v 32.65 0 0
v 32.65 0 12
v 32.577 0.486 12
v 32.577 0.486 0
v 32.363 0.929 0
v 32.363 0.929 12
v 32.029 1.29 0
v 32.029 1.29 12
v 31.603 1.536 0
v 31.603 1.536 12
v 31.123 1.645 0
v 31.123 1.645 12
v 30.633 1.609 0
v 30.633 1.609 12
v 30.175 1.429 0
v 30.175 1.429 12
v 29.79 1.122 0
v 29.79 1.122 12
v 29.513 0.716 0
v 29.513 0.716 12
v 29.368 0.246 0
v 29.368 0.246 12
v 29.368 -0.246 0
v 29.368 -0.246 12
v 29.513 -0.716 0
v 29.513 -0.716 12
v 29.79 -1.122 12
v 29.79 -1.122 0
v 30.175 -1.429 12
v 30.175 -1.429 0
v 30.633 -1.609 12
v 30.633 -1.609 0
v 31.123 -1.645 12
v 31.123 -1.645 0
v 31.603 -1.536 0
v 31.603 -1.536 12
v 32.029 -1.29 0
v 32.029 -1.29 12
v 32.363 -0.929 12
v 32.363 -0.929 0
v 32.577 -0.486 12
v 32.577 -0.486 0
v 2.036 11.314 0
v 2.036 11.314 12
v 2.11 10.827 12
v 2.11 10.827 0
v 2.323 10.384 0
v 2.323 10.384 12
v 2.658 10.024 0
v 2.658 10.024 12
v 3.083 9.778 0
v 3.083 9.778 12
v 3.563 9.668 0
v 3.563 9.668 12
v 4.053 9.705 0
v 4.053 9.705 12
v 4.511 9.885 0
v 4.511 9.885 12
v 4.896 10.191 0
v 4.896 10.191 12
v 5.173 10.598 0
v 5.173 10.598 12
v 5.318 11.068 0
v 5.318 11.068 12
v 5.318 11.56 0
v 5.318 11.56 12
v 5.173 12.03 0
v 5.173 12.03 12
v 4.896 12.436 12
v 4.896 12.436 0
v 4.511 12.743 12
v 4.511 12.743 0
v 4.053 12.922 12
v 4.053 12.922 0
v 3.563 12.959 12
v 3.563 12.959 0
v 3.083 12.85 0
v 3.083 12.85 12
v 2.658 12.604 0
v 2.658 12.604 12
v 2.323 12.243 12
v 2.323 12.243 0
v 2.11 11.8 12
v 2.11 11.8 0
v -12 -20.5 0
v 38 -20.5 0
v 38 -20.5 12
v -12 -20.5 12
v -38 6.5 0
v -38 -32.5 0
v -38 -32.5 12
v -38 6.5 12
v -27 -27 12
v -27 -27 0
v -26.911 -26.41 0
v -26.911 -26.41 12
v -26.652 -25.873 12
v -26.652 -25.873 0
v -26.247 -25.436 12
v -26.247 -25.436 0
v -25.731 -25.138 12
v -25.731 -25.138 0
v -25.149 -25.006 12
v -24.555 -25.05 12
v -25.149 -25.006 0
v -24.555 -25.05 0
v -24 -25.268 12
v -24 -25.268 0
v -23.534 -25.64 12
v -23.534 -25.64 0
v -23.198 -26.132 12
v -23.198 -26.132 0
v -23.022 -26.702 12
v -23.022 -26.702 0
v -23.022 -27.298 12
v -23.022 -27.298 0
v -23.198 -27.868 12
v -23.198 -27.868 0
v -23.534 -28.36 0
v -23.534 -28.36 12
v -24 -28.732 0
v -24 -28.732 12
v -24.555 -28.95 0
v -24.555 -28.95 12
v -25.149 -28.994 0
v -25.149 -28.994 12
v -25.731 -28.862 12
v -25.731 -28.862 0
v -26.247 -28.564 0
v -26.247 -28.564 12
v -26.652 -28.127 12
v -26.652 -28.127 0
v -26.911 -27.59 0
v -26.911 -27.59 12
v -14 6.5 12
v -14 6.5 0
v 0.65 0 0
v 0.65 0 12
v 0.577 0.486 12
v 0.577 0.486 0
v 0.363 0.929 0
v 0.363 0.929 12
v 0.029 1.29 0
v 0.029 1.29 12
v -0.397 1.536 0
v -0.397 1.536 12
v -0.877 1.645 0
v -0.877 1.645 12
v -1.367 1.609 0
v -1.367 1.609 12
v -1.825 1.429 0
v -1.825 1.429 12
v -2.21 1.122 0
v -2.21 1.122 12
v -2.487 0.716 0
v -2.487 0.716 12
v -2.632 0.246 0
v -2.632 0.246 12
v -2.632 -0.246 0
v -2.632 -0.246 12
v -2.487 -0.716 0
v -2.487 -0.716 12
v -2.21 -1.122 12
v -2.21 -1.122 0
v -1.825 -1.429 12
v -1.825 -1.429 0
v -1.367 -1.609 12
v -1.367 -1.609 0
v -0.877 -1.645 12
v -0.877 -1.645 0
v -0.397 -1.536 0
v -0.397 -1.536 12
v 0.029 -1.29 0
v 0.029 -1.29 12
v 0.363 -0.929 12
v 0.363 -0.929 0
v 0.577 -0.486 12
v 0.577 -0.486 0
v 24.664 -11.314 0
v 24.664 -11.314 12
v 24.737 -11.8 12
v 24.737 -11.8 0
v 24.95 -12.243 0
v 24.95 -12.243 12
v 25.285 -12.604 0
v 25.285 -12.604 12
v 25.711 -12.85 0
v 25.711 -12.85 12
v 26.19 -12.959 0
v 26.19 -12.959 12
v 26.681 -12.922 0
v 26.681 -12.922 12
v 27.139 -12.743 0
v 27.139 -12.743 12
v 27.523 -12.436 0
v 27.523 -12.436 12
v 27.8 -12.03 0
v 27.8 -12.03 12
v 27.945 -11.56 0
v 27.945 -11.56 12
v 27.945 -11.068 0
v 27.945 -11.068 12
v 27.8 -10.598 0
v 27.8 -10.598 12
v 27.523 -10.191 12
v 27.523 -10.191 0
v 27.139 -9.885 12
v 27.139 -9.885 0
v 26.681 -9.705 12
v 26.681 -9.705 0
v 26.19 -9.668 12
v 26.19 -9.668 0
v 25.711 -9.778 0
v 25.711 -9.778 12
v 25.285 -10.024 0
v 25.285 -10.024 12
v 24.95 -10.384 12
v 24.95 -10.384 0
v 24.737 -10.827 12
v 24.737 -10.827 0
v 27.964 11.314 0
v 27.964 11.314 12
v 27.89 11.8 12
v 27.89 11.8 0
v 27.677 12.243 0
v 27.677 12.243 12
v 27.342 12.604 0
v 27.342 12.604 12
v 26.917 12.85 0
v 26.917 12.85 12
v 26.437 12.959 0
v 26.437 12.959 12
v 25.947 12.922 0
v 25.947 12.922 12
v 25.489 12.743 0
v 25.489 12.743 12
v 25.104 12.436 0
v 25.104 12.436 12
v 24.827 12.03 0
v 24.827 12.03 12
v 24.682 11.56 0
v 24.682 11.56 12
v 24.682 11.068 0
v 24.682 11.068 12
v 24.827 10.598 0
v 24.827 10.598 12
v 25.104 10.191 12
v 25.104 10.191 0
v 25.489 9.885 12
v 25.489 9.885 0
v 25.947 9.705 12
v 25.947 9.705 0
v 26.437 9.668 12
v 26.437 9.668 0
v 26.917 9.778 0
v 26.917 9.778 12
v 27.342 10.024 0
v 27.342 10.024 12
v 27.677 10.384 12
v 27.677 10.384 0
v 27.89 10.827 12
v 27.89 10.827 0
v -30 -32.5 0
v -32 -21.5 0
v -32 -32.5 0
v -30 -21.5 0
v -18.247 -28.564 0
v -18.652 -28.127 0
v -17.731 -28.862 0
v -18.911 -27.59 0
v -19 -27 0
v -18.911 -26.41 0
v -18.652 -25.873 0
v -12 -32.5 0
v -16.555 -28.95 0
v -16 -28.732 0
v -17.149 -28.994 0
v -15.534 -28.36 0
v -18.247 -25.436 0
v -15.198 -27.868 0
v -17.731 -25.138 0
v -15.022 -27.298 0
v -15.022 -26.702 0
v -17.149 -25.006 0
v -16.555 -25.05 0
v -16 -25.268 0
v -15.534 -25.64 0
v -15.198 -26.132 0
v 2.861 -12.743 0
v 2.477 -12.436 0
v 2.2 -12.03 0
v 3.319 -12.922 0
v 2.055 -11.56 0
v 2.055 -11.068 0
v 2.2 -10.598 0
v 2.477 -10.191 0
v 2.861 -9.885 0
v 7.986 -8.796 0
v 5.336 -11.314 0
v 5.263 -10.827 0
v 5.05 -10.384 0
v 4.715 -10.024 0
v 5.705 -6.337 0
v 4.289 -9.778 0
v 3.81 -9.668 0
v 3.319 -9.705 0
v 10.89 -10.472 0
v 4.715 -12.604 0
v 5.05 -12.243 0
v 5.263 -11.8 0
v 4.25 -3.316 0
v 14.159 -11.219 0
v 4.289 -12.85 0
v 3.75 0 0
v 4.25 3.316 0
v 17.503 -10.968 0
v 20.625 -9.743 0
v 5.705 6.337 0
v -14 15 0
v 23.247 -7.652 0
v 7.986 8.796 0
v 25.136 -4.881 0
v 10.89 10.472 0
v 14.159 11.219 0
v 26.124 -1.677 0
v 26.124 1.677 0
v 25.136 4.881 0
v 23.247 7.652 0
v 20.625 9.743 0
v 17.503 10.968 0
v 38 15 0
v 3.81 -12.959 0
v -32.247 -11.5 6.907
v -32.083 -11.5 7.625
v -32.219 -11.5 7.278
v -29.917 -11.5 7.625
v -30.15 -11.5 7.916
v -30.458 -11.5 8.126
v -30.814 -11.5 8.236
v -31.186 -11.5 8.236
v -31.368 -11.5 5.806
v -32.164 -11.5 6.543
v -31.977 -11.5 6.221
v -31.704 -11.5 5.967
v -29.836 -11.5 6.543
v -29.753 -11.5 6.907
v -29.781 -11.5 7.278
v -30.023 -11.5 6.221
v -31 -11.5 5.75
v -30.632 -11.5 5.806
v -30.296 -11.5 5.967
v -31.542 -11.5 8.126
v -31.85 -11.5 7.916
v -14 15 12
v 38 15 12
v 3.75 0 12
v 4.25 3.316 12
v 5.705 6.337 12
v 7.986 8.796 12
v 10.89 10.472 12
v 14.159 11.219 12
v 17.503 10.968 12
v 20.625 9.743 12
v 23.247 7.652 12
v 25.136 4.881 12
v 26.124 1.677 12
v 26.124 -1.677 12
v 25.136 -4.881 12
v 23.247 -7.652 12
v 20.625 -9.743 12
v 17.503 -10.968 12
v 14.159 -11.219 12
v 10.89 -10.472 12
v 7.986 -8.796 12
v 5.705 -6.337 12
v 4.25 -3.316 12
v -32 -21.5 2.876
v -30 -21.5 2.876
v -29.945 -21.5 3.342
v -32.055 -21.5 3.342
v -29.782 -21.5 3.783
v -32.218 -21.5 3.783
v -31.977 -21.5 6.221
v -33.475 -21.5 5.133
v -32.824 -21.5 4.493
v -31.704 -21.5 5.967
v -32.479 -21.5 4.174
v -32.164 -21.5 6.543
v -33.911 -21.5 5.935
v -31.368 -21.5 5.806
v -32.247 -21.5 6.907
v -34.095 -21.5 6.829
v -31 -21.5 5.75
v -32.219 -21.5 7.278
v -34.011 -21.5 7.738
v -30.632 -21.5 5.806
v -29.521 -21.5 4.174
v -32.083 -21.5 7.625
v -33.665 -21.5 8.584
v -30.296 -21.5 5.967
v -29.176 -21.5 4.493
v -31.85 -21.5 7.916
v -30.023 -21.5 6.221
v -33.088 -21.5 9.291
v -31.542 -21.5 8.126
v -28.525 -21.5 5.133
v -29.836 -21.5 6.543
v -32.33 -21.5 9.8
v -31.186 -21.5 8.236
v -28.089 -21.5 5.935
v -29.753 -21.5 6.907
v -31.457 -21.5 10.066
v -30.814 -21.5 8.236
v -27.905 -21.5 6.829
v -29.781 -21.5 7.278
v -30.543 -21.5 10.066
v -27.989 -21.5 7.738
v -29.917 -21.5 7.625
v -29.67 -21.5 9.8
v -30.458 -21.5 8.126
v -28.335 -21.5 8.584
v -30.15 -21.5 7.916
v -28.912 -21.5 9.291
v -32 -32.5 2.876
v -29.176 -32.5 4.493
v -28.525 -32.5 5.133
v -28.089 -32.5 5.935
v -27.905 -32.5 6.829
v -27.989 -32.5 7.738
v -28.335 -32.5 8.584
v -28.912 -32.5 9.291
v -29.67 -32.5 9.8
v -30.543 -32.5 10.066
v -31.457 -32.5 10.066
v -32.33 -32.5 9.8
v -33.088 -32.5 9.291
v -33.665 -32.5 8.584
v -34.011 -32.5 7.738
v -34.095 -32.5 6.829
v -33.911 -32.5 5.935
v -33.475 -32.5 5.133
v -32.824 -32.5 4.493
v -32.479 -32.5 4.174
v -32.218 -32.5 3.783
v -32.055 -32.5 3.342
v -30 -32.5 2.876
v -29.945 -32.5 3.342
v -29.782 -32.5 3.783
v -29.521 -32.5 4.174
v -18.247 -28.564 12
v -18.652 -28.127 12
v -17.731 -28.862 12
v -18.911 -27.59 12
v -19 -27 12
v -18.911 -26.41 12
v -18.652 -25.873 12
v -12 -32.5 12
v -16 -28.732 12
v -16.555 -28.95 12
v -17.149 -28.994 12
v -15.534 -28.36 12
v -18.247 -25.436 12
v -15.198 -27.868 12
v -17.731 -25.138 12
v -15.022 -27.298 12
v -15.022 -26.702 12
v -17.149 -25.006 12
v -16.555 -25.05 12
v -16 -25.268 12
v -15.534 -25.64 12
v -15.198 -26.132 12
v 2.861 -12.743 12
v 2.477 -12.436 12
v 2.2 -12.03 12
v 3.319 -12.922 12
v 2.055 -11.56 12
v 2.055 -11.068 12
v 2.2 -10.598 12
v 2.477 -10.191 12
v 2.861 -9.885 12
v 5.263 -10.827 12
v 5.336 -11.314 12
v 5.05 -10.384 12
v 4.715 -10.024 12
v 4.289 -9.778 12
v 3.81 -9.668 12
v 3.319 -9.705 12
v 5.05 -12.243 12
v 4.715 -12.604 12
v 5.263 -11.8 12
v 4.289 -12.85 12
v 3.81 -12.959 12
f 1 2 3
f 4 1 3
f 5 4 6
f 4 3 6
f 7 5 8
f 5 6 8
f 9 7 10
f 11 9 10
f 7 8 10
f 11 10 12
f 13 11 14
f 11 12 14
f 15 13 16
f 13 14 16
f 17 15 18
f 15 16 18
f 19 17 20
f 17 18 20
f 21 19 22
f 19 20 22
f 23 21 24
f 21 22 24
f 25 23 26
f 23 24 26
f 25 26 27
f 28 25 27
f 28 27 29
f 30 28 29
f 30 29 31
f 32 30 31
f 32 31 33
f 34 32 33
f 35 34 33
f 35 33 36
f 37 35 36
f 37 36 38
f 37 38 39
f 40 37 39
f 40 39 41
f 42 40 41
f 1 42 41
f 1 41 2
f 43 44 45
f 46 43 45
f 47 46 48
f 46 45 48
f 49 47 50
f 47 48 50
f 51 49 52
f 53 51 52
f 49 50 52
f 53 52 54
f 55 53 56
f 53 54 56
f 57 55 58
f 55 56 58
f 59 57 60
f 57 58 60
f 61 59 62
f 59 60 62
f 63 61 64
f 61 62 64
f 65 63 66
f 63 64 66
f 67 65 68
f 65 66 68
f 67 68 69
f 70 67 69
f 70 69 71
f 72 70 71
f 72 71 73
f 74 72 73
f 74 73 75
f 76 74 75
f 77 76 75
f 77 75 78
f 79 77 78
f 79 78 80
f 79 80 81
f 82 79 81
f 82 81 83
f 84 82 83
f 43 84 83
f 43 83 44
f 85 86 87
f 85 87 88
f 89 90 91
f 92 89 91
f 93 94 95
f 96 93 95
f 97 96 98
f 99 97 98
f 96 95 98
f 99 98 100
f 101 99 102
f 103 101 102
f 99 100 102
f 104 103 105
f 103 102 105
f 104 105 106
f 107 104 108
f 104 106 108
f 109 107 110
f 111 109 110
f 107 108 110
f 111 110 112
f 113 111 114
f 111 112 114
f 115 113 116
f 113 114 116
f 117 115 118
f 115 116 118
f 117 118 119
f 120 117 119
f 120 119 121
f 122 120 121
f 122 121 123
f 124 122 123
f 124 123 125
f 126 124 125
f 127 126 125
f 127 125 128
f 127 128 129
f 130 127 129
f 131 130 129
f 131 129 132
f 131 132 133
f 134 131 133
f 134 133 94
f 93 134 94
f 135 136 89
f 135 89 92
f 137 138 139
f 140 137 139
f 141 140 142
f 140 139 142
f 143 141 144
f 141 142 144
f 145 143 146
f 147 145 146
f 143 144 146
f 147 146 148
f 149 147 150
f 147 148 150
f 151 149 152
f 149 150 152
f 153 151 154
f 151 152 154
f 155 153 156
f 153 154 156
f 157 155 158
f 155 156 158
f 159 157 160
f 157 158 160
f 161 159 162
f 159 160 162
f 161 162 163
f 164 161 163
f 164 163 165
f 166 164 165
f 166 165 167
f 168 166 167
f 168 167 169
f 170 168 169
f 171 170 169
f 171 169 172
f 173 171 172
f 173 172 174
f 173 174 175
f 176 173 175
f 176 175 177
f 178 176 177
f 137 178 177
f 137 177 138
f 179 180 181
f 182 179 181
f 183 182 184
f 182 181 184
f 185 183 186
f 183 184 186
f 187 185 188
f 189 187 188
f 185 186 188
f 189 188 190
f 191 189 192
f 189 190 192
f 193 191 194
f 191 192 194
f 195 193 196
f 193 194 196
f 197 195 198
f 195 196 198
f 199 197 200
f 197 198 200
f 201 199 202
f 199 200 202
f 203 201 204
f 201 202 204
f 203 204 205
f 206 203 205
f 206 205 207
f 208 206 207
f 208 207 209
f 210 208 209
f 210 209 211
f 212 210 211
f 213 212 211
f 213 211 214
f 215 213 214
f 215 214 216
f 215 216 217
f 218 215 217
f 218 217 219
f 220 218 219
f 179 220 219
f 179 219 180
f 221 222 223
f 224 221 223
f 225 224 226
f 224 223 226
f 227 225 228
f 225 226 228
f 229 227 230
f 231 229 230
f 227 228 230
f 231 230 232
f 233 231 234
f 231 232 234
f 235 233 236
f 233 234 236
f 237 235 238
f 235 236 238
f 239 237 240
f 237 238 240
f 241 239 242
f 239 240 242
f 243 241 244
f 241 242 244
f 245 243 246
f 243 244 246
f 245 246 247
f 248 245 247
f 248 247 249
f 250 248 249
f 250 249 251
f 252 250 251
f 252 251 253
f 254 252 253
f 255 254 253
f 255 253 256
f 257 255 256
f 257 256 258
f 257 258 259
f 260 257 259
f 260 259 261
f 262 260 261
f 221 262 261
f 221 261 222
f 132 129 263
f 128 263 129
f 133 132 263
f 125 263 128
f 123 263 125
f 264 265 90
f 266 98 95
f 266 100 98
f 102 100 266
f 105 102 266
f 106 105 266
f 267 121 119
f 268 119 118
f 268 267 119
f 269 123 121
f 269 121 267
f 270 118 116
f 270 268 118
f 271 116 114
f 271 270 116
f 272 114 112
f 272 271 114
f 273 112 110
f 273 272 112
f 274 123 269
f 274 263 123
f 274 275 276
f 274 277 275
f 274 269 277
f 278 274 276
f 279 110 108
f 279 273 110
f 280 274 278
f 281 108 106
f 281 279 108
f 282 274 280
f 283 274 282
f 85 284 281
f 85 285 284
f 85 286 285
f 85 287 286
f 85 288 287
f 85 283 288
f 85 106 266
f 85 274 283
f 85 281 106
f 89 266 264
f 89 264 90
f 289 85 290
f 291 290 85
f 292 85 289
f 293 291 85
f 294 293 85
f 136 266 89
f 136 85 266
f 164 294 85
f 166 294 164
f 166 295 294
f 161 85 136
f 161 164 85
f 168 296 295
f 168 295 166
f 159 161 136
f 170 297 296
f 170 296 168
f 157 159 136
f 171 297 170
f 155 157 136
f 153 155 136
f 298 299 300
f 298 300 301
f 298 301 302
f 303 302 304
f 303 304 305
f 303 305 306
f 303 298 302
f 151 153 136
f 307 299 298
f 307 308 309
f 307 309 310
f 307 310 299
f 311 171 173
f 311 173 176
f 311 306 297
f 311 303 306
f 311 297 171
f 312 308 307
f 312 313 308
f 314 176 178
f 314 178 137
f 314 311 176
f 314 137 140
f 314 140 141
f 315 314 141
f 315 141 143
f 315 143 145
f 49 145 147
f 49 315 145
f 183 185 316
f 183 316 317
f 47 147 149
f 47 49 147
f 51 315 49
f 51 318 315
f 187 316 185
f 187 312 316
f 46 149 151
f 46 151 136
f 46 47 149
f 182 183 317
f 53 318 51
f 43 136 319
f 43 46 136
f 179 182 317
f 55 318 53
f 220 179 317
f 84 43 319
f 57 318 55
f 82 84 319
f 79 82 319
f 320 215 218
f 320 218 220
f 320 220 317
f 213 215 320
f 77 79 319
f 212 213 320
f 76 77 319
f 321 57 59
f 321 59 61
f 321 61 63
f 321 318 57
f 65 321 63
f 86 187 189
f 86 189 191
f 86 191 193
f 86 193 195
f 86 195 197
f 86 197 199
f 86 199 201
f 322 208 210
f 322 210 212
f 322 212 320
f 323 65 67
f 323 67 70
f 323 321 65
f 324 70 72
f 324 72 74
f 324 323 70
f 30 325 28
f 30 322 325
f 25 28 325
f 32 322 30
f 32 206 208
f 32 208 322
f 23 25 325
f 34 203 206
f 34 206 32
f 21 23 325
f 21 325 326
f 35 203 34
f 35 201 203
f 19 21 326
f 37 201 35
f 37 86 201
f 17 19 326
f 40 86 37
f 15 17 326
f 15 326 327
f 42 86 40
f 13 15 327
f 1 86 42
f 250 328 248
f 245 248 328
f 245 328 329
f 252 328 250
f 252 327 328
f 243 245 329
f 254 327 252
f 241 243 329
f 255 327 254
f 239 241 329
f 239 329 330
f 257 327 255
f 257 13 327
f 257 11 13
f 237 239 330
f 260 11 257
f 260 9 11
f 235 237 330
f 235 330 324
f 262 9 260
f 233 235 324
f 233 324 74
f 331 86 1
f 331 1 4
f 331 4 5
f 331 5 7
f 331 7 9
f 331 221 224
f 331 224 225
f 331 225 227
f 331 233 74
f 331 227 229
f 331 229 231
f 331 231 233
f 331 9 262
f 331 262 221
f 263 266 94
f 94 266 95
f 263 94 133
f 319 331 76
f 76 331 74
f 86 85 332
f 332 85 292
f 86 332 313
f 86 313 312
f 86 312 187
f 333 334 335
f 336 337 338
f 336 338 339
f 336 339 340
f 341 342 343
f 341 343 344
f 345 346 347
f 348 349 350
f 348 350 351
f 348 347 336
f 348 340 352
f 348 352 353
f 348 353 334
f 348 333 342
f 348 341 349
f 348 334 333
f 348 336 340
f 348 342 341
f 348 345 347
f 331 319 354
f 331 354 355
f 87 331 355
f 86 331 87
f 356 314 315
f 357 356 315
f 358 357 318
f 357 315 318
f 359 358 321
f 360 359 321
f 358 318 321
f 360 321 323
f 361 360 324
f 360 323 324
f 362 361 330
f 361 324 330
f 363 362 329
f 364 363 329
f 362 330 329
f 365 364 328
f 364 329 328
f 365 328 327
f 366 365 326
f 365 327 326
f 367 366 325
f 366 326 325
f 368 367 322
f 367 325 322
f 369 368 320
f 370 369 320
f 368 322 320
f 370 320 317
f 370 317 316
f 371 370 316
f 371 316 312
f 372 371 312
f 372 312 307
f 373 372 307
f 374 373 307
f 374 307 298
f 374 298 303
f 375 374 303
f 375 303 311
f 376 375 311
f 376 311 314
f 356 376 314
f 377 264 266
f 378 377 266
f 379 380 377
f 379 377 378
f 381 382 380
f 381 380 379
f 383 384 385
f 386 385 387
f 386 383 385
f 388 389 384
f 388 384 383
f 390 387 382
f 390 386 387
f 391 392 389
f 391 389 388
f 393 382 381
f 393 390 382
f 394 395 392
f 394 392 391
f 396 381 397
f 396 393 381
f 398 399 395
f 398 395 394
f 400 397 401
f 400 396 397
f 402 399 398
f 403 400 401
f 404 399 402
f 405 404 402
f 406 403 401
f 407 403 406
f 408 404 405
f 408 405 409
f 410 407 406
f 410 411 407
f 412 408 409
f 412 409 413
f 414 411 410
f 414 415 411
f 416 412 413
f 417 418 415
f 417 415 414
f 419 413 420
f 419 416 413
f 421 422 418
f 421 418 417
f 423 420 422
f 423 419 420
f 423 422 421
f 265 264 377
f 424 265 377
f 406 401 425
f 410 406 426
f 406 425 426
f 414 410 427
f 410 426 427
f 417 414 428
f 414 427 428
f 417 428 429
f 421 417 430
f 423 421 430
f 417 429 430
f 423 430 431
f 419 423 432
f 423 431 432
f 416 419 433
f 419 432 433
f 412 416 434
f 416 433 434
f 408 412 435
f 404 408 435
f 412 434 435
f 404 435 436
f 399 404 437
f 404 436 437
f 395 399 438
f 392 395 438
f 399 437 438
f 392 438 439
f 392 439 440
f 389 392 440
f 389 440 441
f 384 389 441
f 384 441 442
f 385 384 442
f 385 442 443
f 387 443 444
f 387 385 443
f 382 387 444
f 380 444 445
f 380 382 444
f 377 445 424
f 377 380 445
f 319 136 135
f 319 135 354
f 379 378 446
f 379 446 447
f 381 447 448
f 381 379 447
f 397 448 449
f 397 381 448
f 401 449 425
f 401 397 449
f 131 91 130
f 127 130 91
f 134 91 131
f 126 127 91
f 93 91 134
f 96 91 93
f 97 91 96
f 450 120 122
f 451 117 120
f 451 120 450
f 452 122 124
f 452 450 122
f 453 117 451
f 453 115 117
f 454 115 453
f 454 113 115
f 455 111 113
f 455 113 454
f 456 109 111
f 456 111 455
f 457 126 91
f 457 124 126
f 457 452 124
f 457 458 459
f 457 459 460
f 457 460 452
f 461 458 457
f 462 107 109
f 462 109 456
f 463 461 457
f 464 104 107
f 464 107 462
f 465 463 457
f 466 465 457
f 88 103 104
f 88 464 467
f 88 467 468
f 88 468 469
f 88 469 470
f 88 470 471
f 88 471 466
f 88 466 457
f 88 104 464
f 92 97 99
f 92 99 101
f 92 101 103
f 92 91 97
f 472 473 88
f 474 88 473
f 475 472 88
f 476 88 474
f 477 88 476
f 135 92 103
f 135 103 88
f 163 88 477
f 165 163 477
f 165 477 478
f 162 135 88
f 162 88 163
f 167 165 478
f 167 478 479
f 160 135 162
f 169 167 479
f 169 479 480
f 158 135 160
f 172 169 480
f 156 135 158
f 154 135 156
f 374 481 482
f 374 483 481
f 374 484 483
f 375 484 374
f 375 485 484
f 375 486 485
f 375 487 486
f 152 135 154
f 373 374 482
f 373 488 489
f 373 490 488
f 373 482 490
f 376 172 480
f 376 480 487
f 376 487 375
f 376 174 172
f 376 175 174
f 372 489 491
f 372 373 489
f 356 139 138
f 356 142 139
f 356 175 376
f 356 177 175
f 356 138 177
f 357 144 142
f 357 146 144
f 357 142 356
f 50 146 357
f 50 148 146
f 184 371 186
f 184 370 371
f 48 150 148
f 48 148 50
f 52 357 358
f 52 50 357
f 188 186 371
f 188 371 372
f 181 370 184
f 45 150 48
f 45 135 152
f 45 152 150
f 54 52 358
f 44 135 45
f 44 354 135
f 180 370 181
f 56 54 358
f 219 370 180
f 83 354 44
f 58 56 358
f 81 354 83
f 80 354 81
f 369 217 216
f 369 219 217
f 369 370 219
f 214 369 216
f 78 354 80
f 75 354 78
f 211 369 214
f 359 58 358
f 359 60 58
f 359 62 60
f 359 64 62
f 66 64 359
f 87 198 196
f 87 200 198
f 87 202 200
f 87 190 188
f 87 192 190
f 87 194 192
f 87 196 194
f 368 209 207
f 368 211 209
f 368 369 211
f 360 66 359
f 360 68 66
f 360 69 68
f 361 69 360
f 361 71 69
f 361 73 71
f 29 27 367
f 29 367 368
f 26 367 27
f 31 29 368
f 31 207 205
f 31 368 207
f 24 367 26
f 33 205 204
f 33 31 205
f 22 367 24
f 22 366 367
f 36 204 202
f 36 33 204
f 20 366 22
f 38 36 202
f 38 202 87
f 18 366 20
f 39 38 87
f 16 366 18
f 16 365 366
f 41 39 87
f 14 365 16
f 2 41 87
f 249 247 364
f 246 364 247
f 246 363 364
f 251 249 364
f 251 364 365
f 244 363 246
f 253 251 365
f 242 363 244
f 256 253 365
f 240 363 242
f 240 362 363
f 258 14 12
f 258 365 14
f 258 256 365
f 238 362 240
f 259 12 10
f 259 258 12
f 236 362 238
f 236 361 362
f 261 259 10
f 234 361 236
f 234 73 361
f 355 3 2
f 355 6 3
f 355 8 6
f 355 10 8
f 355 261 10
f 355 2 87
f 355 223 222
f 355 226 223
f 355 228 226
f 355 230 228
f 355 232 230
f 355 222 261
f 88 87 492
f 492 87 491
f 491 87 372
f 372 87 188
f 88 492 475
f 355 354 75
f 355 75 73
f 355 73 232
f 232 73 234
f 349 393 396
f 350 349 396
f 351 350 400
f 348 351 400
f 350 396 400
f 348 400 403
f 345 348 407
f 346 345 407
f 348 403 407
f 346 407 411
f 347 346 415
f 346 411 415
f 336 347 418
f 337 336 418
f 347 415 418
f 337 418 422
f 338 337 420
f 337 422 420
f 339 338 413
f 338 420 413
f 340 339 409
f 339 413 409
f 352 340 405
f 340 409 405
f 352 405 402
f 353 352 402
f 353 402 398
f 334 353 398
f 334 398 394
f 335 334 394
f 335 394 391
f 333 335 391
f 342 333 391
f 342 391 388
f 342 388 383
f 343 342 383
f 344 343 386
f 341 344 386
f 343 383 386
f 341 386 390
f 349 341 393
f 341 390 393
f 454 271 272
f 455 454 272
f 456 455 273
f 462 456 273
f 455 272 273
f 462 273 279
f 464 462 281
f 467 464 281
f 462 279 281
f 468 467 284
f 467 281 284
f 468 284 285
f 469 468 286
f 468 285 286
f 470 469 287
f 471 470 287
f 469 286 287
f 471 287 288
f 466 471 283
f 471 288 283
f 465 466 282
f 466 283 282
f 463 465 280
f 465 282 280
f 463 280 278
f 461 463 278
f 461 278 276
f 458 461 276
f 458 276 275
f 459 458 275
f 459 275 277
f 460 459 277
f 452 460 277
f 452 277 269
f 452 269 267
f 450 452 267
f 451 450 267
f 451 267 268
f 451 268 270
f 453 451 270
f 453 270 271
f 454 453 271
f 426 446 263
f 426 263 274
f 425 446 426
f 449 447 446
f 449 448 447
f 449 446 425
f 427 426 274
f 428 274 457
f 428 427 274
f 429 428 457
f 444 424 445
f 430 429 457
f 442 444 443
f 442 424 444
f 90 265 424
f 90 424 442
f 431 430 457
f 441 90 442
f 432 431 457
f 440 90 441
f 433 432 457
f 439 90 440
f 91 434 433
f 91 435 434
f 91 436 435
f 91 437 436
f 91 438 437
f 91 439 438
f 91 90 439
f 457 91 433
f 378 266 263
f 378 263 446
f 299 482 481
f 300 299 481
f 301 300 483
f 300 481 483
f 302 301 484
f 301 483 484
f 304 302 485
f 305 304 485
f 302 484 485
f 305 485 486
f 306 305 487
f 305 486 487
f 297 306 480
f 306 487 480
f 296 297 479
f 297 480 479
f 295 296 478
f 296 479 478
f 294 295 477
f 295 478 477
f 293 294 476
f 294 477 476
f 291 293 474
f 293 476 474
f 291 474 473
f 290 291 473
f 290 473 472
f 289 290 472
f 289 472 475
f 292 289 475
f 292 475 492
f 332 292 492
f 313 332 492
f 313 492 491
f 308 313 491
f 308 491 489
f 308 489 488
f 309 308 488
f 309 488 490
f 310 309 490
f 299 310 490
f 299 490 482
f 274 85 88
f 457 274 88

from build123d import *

# Parameters (mm, degrees)
SKETCH_1_W           = 70
SKETCH_1_H           = 30
EXTRUDE_1_DEPTH      = 27
CUT_EXTRUDE_1_DEPTH  = 47.679760068
SKETCH_3_R           = 1.65
CUT_EXTRUDE_2_DEPTH  = 47.679760068
SKETCH_4_W           = 21
SKETCH_4_H           = 8.5
CUT_EXTRUDE_3_DEPTH  = 47.679760068
SKETCH_7_R           = 11.25
CUT_EXTRUDE_5_DEPTH  = 47.679760068
SKETCH_8_W           = 21.5
SKETCH_8_H           = 21.5
EXTRUDE_2_DEPTH      = 8
SKETCH_10_R          = 1.5
CUT_EXTRUDE_6_DEPTH  = 54.422841557
SKETCH_12_W          = 35
SKETCH_12_H          = 21.5
EXTRUDE_3_DEPTH      = 3
SKETCH_13_R          = 3
CUT_EXTRUDE_7_DEPTH  = 15
SKETCH_14_R          = 1.65
EXTRUDE_4_DEPTH      = 27
SKETCH_15_W          = 27
SKETCH_15_H          = 30
EXTRUDE_5_DEPTH      = 3
EXTRUDE_START        = 5.5
SKETCH_16_R          = 3
EXTRUDE_6_DEPTH      = 5.5
SKETCH_22_W          = 26
SKETCH_22_H          = 15
CUT_EXTRUDE_9_DEPTH  = 8
EXTRUDE_START_2      = 8
SKETCH_20_R          = 11.25
EXTRUDE_8_DEPTH      = 8
CUT_EXTRUDE_8_DEPTH  = 8
SKETCH_23_W          = 26
SKETCH_23_H          = 20
EXTRUDE_9_DEPTH      = 17
SKETCH_24_R          = 2
CUT_EXTRUDE_10_DEPTH = 64.837684795
SKETCH_25_R          = 3.75
CUT_EXTRUDE_11_DEPTH = 5
SKETCH_26_R          = 3.1
CUT_EXTRUDE_12_DEPTH = 16
SKETCH_27_R          = 1.25
CUT_EXTRUDE_13_DEPTH = 10
SKETCH_28_W          = 2
SKETCH_28_H          = 12.06571985
CUT_EXTRUDE_14_DEPTH = 16
FILLET_1_R           = 2
SKETCH_29_W          = 20
SKETCH_29_H          = 5
CUT_EXTRUDE_15_DEPTH = 89.945207853
SKETCH_30_W          = 8
SKETCH_30_H          = 47.5
CUT_EXTRUDE_16_DEPTH = 87.955448363
SKETCH_31_W          = 15
SKETCH_31_H          = 35.5
CUT_EXTRUDE_17_DEPTH = 87.955448363


with BuildPart() as part:
    # 草图1 → 凸台-拉伸1 (new body)
    with BuildSketch(Plane.XY):
        Rectangle(SKETCH_1_W, SKETCH_1_H)
    extrude(amount=EXTRUDE_1_DEPTH)

    # 草图2 → 切除-拉伸1 (cut, through all)
    with BuildSketch(Plane.XY.offset(27)):
        with BuildLine():
            Line((28.228756555, -15), (35, -15))
            Line((35, -15), (35, 0))
            ThreePointArc((35, 0), (33.228756555, -8.228756555), (28.228756555, -15))
        make_face()
        with BuildLine():
            ThreePointArc((28.228756555, 15), (33.228756555, 8.228756555), (35, 0))
            Line((35, 0), (35, 15))
            Line((35, 15), (28.228756555, 15))
        make_face()
    extrude(amount=-CUT_EXTRUDE_1_DEPTH, mode=Mode.SUBTRACT)

    # 草图3 → 切除-拉伸2 (cut, through all)
    with BuildSketch(Plane.XY.offset(27)):
        with Locations((31, 0)):
            Circle(SKETCH_3_R)
        with Locations((26.313708499, 11.313708499)):
            Circle(SKETCH_3_R)
        with Locations(Location((26.313708499, -11.313708499, 0), (0, 0, 180))):
            Circle(SKETCH_3_R)
        with Locations(Location((3.686291501, 11.313708499, 0), (0, 0, 180))):
            Circle(SKETCH_3_R)
        with Locations((3.686291501, -11.313708499)):
            Circle(SKETCH_3_R)
        with Locations((-1, 0)):
            Circle(SKETCH_3_R)
    extrude(amount=-CUT_EXTRUDE_2_DEPTH, mode=Mode.SUBTRACT)

    # 草图4 → 切除-拉伸3 (cut, through all)
    with BuildSketch(Plane.XY.offset(27)):
        with Locations((-24.5, 10.75)):
            Rectangle(SKETCH_4_W, SKETCH_4_H)
    extrude(amount=-CUT_EXTRUDE_3_DEPTH, mode=Mode.SUBTRACT)

    # 草图7 → 切除-拉伸5 (cut, through all)
    with BuildSketch(Plane(origin=(0, 0, 0), x_dir=(-1, 0, 0), z_dir=(0, 0, -1))):
        with Locations((-15, 0)):
            Circle(SKETCH_7_R)
    extrude(amount=-CUT_EXTRUDE_5_DEPTH, mode=Mode.SUBTRACT)

    # 草图8 → 凸台-拉伸2 (add)
    with BuildSketch(Plane(origin=(0, 0, 0), x_dir=(-1, 0, 0), z_dir=(0, 0, -1))):
        with Locations((24.25, -4.25)):
            Rectangle(SKETCH_8_W, SKETCH_8_H)
    extrude(amount=EXTRUDE_2_DEPTH)

    # 草图10 → 切除-拉伸6 (cut, through all)
    with BuildSketch(Plane.XZ.offset(15)):
        with Locations(Location((-17.5, 19.95, 0), (0, 0, 270))):
            Circle(SKETCH_10_R)
        with Locations(Location((-32.5, 19.95, 0), (0, 0, 270))):
            Circle(SKETCH_10_R)
    extrude(amount=-CUT_EXTRUDE_6_DEPTH, mode=Mode.SUBTRACT)

    # 草图12 → 凸台-拉伸3 (add)
    with BuildSketch(Plane.ZY.offset(35)):
        with Locations((9.5, -4.25)):
            Rectangle(SKETCH_12_W, SKETCH_12_H)
    extrude(amount=EXTRUDE_3_DEPTH)

    # 草图13 → 切除-拉伸7 (cut)
    with BuildSketch(Plane.XZ.offset(15)):
        with Locations(Location((-32.5, 19.95, 0), (0, 0, 270))):
            Circle(SKETCH_13_R)
        with Locations(Location((-17.5, 19.95, 0), (0, 0, 270))):
            Circle(SKETCH_13_R)
    extrude(amount=-CUT_EXTRUDE_7_DEPTH, mode=Mode.SUBTRACT)

    # 草图14 → 凸台-拉伸4 (add)
    with BuildSketch(Plane.XY.offset(27)):
        Polygon((28.228756555, -15), (35, -15), (35, 0), (35, 15), (28.228756555, 15), (28.228756555, 12.920752662), (28.228756555, 9.706664336), (28.228756555, 0), (28.228756555, -9.706664336), (28.228756555, -12.920752662), align=None)
        with Locations((31, 0)):
            Circle(SKETCH_14_R, mode=Mode.SUBTRACT)
    extrude(amount=-EXTRUDE_4_DEPTH)

    # 草图15 → 凸台-拉伸5 (add)
    with BuildSketch(Plane(origin=(35, 0, 0), x_dir=(0, 0, -1), z_dir=(1, 0, 0))):
        with Locations((-13.5, 0)):
            Rectangle(SKETCH_15_W, SKETCH_15_H)
    extrude(amount=EXTRUDE_5_DEPTH)

    # 草图16 → 凸台-拉伸6 (add)
    with BuildSketch(Plane.XZ.offset(15).offset(EXTRUDE_START)):
        Polygon((-13.5, 0), (38, 0), (38, 27), (-38, 27), (-38, -8), (-13.5, -8), align=None)
        with Locations(Location((-32.5, 19.95, 0), (0, 0, 270))):
            Circle(SKETCH_16_R, mode=Mode.SUBTRACT)
        with Locations(Location((-17.5, 19.95, 0), (0, 0, 270))):
            Circle(SKETCH_16_R, mode=Mode.SUBTRACT)
    extrude(amount=-EXTRUDE_6_DEPTH)

    # 草图22 → 切除-拉伸9 (cut)
    with BuildSketch(Plane.XZ.offset(20.5)):
        with Locations((-25, 19.5)):
            Rectangle(SKETCH_22_W, SKETCH_22_H)
    extrude(amount=-CUT_EXTRUDE_9_DEPTH, mode=Mode.SUBTRACT)

    # 草图20 → 凸台-拉伸8 (add)
    with BuildSketch(Plane(origin=(0, 0, 0), x_dir=(-1, 0, 0), z_dir=(0, 0, -1)).offset(EXTRUDE_START_2)):
        Polygon((14, 15), (-38, 15), (-38, -20.5), (13.5, -20.5), (13.5, 6.5), (14, 6.5), align=None)
        with Locations((-15, 0)):
            Circle(SKETCH_20_R, mode=Mode.SUBTRACT)
    extrude(amount=-EXTRUDE_8_DEPTH)

    # 草图21 → 切除-拉伸8 (cut)
    with BuildSketch(Plane(origin=(0, 0, -8), x_dir=(-1, 0, 0), z_dir=(0, 0, -1))):
        with BuildLine():
            Line((-27.816005618, -16), (-2.183994382, -16))
            ThreePointArc((-2.183994382, -16), (-15, 20.5), (-27.816005618, -16))
        make_face()
    extrude(amount=-CUT_EXTRUDE_8_DEPTH, mode=Mode.SUBTRACT)

    # 草图23 → 凸台-拉伸9 (add)
    with BuildSketch(Plane.XZ.offset(20.5)):
        with Locations((-25, 2)):
            Rectangle(SKETCH_23_W, SKETCH_23_H)
    extrude(amount=EXTRUDE_9_DEPTH)

    # 草图24 → 切除-拉伸10 (cut, through all)
    with BuildSketch(Plane(origin=(0, 0, -8), x_dir=(-1, 0, 0), z_dir=(0, 0, -1))):
        with Locations((17, -27)):
            Circle(SKETCH_24_R)
        with Locations((25, -27)):
            Circle(SKETCH_24_R)
    extrude(amount=-CUT_EXTRUDE_10_DEPTH, mode=Mode.SUBTRACT)

    # 草图25 → 切除-拉伸11 (cut)
    with BuildSketch(Plane(origin=(0, 0, -8), x_dir=(-1, 0, 0), z_dir=(0, 0, -1))):
        with Locations((17, -27)):
            Circle(SKETCH_25_R)
        with Locations((25, -27)):
            Circle(SKETCH_25_R)
    extrude(amount=-CUT_EXTRUDE_11_DEPTH, mode=Mode.SUBTRACT)

    # 草图26 → 切除-拉伸12 (cut)
    with BuildSketch(Plane.XZ.offset(37.5)):
        with Locations(Location((-31, 7, 0), (0, 0, 270))):
            Circle(SKETCH_26_R)
    extrude(amount=-CUT_EXTRUDE_12_DEPTH, mode=Mode.SUBTRACT)

    # 草图27 → 切除-拉伸13 (cut)
    with BuildSketch(Plane.XZ.offset(21.5)):
        with Locations(Location((-31, 7, 0), (0, 0, 270))):
            Circle(SKETCH_27_R)
    extrude(amount=-CUT_EXTRUDE_13_DEPTH, mode=Mode.SUBTRACT)

    # 草图28 → 切除-拉伸14 (cut)
    with BuildSketch(Plane.XZ.offset(37.5)):
        with Locations((-31, -1.967140075)):
            Rectangle(SKETCH_28_W, SKETCH_28_H)
    extrude(amount=-CUT_EXTRUDE_14_DEPTH, mode=Mode.SUBTRACT)

    # 圆角1
    fillet_1_edges = [part.edges().sort_by_distance(p)[0] for p in [
        (-32, -29.5, 4.06571985),
        (-30, -29.5, 4.06571985),
    ]]
    fillet(fillet_1_edges, radius=FILLET_1_R)

    # 草图29 → 切除-拉伸15 (cut, through all)
    with BuildSketch(Plane.ZY.offset(38)):
        with Locations((2, -35)):
            Rectangle(SKETCH_29_W, SKETCH_29_H)
    extrude(amount=-CUT_EXTRUDE_15_DEPTH, mode=Mode.SUBTRACT)

    # 草图30 → 切除-拉伸16 (cut, through all)
    with BuildSketch(Plane(origin=(38, 0, 0), x_dir=(0, 0, -1), z_dir=(1, 0, 0))):
        with Locations((4, -8.75)):
            Rectangle(SKETCH_30_W, SKETCH_30_H)
    extrude(amount=-CUT_EXTRUDE_16_DEPTH, mode=Mode.SUBTRACT)

    # 草图31 → 切除-拉伸17 (cut, through all)
    with BuildSketch(Plane.ZY.offset(38)):
        with Locations((19.5, -2.75)):
            Rectangle(SKETCH_31_W, SKETCH_31_H)
    extrude(amount=-CUT_EXTRUDE_17_DEPTH, mode=Mode.SUBTRACT)


solid = part.part
